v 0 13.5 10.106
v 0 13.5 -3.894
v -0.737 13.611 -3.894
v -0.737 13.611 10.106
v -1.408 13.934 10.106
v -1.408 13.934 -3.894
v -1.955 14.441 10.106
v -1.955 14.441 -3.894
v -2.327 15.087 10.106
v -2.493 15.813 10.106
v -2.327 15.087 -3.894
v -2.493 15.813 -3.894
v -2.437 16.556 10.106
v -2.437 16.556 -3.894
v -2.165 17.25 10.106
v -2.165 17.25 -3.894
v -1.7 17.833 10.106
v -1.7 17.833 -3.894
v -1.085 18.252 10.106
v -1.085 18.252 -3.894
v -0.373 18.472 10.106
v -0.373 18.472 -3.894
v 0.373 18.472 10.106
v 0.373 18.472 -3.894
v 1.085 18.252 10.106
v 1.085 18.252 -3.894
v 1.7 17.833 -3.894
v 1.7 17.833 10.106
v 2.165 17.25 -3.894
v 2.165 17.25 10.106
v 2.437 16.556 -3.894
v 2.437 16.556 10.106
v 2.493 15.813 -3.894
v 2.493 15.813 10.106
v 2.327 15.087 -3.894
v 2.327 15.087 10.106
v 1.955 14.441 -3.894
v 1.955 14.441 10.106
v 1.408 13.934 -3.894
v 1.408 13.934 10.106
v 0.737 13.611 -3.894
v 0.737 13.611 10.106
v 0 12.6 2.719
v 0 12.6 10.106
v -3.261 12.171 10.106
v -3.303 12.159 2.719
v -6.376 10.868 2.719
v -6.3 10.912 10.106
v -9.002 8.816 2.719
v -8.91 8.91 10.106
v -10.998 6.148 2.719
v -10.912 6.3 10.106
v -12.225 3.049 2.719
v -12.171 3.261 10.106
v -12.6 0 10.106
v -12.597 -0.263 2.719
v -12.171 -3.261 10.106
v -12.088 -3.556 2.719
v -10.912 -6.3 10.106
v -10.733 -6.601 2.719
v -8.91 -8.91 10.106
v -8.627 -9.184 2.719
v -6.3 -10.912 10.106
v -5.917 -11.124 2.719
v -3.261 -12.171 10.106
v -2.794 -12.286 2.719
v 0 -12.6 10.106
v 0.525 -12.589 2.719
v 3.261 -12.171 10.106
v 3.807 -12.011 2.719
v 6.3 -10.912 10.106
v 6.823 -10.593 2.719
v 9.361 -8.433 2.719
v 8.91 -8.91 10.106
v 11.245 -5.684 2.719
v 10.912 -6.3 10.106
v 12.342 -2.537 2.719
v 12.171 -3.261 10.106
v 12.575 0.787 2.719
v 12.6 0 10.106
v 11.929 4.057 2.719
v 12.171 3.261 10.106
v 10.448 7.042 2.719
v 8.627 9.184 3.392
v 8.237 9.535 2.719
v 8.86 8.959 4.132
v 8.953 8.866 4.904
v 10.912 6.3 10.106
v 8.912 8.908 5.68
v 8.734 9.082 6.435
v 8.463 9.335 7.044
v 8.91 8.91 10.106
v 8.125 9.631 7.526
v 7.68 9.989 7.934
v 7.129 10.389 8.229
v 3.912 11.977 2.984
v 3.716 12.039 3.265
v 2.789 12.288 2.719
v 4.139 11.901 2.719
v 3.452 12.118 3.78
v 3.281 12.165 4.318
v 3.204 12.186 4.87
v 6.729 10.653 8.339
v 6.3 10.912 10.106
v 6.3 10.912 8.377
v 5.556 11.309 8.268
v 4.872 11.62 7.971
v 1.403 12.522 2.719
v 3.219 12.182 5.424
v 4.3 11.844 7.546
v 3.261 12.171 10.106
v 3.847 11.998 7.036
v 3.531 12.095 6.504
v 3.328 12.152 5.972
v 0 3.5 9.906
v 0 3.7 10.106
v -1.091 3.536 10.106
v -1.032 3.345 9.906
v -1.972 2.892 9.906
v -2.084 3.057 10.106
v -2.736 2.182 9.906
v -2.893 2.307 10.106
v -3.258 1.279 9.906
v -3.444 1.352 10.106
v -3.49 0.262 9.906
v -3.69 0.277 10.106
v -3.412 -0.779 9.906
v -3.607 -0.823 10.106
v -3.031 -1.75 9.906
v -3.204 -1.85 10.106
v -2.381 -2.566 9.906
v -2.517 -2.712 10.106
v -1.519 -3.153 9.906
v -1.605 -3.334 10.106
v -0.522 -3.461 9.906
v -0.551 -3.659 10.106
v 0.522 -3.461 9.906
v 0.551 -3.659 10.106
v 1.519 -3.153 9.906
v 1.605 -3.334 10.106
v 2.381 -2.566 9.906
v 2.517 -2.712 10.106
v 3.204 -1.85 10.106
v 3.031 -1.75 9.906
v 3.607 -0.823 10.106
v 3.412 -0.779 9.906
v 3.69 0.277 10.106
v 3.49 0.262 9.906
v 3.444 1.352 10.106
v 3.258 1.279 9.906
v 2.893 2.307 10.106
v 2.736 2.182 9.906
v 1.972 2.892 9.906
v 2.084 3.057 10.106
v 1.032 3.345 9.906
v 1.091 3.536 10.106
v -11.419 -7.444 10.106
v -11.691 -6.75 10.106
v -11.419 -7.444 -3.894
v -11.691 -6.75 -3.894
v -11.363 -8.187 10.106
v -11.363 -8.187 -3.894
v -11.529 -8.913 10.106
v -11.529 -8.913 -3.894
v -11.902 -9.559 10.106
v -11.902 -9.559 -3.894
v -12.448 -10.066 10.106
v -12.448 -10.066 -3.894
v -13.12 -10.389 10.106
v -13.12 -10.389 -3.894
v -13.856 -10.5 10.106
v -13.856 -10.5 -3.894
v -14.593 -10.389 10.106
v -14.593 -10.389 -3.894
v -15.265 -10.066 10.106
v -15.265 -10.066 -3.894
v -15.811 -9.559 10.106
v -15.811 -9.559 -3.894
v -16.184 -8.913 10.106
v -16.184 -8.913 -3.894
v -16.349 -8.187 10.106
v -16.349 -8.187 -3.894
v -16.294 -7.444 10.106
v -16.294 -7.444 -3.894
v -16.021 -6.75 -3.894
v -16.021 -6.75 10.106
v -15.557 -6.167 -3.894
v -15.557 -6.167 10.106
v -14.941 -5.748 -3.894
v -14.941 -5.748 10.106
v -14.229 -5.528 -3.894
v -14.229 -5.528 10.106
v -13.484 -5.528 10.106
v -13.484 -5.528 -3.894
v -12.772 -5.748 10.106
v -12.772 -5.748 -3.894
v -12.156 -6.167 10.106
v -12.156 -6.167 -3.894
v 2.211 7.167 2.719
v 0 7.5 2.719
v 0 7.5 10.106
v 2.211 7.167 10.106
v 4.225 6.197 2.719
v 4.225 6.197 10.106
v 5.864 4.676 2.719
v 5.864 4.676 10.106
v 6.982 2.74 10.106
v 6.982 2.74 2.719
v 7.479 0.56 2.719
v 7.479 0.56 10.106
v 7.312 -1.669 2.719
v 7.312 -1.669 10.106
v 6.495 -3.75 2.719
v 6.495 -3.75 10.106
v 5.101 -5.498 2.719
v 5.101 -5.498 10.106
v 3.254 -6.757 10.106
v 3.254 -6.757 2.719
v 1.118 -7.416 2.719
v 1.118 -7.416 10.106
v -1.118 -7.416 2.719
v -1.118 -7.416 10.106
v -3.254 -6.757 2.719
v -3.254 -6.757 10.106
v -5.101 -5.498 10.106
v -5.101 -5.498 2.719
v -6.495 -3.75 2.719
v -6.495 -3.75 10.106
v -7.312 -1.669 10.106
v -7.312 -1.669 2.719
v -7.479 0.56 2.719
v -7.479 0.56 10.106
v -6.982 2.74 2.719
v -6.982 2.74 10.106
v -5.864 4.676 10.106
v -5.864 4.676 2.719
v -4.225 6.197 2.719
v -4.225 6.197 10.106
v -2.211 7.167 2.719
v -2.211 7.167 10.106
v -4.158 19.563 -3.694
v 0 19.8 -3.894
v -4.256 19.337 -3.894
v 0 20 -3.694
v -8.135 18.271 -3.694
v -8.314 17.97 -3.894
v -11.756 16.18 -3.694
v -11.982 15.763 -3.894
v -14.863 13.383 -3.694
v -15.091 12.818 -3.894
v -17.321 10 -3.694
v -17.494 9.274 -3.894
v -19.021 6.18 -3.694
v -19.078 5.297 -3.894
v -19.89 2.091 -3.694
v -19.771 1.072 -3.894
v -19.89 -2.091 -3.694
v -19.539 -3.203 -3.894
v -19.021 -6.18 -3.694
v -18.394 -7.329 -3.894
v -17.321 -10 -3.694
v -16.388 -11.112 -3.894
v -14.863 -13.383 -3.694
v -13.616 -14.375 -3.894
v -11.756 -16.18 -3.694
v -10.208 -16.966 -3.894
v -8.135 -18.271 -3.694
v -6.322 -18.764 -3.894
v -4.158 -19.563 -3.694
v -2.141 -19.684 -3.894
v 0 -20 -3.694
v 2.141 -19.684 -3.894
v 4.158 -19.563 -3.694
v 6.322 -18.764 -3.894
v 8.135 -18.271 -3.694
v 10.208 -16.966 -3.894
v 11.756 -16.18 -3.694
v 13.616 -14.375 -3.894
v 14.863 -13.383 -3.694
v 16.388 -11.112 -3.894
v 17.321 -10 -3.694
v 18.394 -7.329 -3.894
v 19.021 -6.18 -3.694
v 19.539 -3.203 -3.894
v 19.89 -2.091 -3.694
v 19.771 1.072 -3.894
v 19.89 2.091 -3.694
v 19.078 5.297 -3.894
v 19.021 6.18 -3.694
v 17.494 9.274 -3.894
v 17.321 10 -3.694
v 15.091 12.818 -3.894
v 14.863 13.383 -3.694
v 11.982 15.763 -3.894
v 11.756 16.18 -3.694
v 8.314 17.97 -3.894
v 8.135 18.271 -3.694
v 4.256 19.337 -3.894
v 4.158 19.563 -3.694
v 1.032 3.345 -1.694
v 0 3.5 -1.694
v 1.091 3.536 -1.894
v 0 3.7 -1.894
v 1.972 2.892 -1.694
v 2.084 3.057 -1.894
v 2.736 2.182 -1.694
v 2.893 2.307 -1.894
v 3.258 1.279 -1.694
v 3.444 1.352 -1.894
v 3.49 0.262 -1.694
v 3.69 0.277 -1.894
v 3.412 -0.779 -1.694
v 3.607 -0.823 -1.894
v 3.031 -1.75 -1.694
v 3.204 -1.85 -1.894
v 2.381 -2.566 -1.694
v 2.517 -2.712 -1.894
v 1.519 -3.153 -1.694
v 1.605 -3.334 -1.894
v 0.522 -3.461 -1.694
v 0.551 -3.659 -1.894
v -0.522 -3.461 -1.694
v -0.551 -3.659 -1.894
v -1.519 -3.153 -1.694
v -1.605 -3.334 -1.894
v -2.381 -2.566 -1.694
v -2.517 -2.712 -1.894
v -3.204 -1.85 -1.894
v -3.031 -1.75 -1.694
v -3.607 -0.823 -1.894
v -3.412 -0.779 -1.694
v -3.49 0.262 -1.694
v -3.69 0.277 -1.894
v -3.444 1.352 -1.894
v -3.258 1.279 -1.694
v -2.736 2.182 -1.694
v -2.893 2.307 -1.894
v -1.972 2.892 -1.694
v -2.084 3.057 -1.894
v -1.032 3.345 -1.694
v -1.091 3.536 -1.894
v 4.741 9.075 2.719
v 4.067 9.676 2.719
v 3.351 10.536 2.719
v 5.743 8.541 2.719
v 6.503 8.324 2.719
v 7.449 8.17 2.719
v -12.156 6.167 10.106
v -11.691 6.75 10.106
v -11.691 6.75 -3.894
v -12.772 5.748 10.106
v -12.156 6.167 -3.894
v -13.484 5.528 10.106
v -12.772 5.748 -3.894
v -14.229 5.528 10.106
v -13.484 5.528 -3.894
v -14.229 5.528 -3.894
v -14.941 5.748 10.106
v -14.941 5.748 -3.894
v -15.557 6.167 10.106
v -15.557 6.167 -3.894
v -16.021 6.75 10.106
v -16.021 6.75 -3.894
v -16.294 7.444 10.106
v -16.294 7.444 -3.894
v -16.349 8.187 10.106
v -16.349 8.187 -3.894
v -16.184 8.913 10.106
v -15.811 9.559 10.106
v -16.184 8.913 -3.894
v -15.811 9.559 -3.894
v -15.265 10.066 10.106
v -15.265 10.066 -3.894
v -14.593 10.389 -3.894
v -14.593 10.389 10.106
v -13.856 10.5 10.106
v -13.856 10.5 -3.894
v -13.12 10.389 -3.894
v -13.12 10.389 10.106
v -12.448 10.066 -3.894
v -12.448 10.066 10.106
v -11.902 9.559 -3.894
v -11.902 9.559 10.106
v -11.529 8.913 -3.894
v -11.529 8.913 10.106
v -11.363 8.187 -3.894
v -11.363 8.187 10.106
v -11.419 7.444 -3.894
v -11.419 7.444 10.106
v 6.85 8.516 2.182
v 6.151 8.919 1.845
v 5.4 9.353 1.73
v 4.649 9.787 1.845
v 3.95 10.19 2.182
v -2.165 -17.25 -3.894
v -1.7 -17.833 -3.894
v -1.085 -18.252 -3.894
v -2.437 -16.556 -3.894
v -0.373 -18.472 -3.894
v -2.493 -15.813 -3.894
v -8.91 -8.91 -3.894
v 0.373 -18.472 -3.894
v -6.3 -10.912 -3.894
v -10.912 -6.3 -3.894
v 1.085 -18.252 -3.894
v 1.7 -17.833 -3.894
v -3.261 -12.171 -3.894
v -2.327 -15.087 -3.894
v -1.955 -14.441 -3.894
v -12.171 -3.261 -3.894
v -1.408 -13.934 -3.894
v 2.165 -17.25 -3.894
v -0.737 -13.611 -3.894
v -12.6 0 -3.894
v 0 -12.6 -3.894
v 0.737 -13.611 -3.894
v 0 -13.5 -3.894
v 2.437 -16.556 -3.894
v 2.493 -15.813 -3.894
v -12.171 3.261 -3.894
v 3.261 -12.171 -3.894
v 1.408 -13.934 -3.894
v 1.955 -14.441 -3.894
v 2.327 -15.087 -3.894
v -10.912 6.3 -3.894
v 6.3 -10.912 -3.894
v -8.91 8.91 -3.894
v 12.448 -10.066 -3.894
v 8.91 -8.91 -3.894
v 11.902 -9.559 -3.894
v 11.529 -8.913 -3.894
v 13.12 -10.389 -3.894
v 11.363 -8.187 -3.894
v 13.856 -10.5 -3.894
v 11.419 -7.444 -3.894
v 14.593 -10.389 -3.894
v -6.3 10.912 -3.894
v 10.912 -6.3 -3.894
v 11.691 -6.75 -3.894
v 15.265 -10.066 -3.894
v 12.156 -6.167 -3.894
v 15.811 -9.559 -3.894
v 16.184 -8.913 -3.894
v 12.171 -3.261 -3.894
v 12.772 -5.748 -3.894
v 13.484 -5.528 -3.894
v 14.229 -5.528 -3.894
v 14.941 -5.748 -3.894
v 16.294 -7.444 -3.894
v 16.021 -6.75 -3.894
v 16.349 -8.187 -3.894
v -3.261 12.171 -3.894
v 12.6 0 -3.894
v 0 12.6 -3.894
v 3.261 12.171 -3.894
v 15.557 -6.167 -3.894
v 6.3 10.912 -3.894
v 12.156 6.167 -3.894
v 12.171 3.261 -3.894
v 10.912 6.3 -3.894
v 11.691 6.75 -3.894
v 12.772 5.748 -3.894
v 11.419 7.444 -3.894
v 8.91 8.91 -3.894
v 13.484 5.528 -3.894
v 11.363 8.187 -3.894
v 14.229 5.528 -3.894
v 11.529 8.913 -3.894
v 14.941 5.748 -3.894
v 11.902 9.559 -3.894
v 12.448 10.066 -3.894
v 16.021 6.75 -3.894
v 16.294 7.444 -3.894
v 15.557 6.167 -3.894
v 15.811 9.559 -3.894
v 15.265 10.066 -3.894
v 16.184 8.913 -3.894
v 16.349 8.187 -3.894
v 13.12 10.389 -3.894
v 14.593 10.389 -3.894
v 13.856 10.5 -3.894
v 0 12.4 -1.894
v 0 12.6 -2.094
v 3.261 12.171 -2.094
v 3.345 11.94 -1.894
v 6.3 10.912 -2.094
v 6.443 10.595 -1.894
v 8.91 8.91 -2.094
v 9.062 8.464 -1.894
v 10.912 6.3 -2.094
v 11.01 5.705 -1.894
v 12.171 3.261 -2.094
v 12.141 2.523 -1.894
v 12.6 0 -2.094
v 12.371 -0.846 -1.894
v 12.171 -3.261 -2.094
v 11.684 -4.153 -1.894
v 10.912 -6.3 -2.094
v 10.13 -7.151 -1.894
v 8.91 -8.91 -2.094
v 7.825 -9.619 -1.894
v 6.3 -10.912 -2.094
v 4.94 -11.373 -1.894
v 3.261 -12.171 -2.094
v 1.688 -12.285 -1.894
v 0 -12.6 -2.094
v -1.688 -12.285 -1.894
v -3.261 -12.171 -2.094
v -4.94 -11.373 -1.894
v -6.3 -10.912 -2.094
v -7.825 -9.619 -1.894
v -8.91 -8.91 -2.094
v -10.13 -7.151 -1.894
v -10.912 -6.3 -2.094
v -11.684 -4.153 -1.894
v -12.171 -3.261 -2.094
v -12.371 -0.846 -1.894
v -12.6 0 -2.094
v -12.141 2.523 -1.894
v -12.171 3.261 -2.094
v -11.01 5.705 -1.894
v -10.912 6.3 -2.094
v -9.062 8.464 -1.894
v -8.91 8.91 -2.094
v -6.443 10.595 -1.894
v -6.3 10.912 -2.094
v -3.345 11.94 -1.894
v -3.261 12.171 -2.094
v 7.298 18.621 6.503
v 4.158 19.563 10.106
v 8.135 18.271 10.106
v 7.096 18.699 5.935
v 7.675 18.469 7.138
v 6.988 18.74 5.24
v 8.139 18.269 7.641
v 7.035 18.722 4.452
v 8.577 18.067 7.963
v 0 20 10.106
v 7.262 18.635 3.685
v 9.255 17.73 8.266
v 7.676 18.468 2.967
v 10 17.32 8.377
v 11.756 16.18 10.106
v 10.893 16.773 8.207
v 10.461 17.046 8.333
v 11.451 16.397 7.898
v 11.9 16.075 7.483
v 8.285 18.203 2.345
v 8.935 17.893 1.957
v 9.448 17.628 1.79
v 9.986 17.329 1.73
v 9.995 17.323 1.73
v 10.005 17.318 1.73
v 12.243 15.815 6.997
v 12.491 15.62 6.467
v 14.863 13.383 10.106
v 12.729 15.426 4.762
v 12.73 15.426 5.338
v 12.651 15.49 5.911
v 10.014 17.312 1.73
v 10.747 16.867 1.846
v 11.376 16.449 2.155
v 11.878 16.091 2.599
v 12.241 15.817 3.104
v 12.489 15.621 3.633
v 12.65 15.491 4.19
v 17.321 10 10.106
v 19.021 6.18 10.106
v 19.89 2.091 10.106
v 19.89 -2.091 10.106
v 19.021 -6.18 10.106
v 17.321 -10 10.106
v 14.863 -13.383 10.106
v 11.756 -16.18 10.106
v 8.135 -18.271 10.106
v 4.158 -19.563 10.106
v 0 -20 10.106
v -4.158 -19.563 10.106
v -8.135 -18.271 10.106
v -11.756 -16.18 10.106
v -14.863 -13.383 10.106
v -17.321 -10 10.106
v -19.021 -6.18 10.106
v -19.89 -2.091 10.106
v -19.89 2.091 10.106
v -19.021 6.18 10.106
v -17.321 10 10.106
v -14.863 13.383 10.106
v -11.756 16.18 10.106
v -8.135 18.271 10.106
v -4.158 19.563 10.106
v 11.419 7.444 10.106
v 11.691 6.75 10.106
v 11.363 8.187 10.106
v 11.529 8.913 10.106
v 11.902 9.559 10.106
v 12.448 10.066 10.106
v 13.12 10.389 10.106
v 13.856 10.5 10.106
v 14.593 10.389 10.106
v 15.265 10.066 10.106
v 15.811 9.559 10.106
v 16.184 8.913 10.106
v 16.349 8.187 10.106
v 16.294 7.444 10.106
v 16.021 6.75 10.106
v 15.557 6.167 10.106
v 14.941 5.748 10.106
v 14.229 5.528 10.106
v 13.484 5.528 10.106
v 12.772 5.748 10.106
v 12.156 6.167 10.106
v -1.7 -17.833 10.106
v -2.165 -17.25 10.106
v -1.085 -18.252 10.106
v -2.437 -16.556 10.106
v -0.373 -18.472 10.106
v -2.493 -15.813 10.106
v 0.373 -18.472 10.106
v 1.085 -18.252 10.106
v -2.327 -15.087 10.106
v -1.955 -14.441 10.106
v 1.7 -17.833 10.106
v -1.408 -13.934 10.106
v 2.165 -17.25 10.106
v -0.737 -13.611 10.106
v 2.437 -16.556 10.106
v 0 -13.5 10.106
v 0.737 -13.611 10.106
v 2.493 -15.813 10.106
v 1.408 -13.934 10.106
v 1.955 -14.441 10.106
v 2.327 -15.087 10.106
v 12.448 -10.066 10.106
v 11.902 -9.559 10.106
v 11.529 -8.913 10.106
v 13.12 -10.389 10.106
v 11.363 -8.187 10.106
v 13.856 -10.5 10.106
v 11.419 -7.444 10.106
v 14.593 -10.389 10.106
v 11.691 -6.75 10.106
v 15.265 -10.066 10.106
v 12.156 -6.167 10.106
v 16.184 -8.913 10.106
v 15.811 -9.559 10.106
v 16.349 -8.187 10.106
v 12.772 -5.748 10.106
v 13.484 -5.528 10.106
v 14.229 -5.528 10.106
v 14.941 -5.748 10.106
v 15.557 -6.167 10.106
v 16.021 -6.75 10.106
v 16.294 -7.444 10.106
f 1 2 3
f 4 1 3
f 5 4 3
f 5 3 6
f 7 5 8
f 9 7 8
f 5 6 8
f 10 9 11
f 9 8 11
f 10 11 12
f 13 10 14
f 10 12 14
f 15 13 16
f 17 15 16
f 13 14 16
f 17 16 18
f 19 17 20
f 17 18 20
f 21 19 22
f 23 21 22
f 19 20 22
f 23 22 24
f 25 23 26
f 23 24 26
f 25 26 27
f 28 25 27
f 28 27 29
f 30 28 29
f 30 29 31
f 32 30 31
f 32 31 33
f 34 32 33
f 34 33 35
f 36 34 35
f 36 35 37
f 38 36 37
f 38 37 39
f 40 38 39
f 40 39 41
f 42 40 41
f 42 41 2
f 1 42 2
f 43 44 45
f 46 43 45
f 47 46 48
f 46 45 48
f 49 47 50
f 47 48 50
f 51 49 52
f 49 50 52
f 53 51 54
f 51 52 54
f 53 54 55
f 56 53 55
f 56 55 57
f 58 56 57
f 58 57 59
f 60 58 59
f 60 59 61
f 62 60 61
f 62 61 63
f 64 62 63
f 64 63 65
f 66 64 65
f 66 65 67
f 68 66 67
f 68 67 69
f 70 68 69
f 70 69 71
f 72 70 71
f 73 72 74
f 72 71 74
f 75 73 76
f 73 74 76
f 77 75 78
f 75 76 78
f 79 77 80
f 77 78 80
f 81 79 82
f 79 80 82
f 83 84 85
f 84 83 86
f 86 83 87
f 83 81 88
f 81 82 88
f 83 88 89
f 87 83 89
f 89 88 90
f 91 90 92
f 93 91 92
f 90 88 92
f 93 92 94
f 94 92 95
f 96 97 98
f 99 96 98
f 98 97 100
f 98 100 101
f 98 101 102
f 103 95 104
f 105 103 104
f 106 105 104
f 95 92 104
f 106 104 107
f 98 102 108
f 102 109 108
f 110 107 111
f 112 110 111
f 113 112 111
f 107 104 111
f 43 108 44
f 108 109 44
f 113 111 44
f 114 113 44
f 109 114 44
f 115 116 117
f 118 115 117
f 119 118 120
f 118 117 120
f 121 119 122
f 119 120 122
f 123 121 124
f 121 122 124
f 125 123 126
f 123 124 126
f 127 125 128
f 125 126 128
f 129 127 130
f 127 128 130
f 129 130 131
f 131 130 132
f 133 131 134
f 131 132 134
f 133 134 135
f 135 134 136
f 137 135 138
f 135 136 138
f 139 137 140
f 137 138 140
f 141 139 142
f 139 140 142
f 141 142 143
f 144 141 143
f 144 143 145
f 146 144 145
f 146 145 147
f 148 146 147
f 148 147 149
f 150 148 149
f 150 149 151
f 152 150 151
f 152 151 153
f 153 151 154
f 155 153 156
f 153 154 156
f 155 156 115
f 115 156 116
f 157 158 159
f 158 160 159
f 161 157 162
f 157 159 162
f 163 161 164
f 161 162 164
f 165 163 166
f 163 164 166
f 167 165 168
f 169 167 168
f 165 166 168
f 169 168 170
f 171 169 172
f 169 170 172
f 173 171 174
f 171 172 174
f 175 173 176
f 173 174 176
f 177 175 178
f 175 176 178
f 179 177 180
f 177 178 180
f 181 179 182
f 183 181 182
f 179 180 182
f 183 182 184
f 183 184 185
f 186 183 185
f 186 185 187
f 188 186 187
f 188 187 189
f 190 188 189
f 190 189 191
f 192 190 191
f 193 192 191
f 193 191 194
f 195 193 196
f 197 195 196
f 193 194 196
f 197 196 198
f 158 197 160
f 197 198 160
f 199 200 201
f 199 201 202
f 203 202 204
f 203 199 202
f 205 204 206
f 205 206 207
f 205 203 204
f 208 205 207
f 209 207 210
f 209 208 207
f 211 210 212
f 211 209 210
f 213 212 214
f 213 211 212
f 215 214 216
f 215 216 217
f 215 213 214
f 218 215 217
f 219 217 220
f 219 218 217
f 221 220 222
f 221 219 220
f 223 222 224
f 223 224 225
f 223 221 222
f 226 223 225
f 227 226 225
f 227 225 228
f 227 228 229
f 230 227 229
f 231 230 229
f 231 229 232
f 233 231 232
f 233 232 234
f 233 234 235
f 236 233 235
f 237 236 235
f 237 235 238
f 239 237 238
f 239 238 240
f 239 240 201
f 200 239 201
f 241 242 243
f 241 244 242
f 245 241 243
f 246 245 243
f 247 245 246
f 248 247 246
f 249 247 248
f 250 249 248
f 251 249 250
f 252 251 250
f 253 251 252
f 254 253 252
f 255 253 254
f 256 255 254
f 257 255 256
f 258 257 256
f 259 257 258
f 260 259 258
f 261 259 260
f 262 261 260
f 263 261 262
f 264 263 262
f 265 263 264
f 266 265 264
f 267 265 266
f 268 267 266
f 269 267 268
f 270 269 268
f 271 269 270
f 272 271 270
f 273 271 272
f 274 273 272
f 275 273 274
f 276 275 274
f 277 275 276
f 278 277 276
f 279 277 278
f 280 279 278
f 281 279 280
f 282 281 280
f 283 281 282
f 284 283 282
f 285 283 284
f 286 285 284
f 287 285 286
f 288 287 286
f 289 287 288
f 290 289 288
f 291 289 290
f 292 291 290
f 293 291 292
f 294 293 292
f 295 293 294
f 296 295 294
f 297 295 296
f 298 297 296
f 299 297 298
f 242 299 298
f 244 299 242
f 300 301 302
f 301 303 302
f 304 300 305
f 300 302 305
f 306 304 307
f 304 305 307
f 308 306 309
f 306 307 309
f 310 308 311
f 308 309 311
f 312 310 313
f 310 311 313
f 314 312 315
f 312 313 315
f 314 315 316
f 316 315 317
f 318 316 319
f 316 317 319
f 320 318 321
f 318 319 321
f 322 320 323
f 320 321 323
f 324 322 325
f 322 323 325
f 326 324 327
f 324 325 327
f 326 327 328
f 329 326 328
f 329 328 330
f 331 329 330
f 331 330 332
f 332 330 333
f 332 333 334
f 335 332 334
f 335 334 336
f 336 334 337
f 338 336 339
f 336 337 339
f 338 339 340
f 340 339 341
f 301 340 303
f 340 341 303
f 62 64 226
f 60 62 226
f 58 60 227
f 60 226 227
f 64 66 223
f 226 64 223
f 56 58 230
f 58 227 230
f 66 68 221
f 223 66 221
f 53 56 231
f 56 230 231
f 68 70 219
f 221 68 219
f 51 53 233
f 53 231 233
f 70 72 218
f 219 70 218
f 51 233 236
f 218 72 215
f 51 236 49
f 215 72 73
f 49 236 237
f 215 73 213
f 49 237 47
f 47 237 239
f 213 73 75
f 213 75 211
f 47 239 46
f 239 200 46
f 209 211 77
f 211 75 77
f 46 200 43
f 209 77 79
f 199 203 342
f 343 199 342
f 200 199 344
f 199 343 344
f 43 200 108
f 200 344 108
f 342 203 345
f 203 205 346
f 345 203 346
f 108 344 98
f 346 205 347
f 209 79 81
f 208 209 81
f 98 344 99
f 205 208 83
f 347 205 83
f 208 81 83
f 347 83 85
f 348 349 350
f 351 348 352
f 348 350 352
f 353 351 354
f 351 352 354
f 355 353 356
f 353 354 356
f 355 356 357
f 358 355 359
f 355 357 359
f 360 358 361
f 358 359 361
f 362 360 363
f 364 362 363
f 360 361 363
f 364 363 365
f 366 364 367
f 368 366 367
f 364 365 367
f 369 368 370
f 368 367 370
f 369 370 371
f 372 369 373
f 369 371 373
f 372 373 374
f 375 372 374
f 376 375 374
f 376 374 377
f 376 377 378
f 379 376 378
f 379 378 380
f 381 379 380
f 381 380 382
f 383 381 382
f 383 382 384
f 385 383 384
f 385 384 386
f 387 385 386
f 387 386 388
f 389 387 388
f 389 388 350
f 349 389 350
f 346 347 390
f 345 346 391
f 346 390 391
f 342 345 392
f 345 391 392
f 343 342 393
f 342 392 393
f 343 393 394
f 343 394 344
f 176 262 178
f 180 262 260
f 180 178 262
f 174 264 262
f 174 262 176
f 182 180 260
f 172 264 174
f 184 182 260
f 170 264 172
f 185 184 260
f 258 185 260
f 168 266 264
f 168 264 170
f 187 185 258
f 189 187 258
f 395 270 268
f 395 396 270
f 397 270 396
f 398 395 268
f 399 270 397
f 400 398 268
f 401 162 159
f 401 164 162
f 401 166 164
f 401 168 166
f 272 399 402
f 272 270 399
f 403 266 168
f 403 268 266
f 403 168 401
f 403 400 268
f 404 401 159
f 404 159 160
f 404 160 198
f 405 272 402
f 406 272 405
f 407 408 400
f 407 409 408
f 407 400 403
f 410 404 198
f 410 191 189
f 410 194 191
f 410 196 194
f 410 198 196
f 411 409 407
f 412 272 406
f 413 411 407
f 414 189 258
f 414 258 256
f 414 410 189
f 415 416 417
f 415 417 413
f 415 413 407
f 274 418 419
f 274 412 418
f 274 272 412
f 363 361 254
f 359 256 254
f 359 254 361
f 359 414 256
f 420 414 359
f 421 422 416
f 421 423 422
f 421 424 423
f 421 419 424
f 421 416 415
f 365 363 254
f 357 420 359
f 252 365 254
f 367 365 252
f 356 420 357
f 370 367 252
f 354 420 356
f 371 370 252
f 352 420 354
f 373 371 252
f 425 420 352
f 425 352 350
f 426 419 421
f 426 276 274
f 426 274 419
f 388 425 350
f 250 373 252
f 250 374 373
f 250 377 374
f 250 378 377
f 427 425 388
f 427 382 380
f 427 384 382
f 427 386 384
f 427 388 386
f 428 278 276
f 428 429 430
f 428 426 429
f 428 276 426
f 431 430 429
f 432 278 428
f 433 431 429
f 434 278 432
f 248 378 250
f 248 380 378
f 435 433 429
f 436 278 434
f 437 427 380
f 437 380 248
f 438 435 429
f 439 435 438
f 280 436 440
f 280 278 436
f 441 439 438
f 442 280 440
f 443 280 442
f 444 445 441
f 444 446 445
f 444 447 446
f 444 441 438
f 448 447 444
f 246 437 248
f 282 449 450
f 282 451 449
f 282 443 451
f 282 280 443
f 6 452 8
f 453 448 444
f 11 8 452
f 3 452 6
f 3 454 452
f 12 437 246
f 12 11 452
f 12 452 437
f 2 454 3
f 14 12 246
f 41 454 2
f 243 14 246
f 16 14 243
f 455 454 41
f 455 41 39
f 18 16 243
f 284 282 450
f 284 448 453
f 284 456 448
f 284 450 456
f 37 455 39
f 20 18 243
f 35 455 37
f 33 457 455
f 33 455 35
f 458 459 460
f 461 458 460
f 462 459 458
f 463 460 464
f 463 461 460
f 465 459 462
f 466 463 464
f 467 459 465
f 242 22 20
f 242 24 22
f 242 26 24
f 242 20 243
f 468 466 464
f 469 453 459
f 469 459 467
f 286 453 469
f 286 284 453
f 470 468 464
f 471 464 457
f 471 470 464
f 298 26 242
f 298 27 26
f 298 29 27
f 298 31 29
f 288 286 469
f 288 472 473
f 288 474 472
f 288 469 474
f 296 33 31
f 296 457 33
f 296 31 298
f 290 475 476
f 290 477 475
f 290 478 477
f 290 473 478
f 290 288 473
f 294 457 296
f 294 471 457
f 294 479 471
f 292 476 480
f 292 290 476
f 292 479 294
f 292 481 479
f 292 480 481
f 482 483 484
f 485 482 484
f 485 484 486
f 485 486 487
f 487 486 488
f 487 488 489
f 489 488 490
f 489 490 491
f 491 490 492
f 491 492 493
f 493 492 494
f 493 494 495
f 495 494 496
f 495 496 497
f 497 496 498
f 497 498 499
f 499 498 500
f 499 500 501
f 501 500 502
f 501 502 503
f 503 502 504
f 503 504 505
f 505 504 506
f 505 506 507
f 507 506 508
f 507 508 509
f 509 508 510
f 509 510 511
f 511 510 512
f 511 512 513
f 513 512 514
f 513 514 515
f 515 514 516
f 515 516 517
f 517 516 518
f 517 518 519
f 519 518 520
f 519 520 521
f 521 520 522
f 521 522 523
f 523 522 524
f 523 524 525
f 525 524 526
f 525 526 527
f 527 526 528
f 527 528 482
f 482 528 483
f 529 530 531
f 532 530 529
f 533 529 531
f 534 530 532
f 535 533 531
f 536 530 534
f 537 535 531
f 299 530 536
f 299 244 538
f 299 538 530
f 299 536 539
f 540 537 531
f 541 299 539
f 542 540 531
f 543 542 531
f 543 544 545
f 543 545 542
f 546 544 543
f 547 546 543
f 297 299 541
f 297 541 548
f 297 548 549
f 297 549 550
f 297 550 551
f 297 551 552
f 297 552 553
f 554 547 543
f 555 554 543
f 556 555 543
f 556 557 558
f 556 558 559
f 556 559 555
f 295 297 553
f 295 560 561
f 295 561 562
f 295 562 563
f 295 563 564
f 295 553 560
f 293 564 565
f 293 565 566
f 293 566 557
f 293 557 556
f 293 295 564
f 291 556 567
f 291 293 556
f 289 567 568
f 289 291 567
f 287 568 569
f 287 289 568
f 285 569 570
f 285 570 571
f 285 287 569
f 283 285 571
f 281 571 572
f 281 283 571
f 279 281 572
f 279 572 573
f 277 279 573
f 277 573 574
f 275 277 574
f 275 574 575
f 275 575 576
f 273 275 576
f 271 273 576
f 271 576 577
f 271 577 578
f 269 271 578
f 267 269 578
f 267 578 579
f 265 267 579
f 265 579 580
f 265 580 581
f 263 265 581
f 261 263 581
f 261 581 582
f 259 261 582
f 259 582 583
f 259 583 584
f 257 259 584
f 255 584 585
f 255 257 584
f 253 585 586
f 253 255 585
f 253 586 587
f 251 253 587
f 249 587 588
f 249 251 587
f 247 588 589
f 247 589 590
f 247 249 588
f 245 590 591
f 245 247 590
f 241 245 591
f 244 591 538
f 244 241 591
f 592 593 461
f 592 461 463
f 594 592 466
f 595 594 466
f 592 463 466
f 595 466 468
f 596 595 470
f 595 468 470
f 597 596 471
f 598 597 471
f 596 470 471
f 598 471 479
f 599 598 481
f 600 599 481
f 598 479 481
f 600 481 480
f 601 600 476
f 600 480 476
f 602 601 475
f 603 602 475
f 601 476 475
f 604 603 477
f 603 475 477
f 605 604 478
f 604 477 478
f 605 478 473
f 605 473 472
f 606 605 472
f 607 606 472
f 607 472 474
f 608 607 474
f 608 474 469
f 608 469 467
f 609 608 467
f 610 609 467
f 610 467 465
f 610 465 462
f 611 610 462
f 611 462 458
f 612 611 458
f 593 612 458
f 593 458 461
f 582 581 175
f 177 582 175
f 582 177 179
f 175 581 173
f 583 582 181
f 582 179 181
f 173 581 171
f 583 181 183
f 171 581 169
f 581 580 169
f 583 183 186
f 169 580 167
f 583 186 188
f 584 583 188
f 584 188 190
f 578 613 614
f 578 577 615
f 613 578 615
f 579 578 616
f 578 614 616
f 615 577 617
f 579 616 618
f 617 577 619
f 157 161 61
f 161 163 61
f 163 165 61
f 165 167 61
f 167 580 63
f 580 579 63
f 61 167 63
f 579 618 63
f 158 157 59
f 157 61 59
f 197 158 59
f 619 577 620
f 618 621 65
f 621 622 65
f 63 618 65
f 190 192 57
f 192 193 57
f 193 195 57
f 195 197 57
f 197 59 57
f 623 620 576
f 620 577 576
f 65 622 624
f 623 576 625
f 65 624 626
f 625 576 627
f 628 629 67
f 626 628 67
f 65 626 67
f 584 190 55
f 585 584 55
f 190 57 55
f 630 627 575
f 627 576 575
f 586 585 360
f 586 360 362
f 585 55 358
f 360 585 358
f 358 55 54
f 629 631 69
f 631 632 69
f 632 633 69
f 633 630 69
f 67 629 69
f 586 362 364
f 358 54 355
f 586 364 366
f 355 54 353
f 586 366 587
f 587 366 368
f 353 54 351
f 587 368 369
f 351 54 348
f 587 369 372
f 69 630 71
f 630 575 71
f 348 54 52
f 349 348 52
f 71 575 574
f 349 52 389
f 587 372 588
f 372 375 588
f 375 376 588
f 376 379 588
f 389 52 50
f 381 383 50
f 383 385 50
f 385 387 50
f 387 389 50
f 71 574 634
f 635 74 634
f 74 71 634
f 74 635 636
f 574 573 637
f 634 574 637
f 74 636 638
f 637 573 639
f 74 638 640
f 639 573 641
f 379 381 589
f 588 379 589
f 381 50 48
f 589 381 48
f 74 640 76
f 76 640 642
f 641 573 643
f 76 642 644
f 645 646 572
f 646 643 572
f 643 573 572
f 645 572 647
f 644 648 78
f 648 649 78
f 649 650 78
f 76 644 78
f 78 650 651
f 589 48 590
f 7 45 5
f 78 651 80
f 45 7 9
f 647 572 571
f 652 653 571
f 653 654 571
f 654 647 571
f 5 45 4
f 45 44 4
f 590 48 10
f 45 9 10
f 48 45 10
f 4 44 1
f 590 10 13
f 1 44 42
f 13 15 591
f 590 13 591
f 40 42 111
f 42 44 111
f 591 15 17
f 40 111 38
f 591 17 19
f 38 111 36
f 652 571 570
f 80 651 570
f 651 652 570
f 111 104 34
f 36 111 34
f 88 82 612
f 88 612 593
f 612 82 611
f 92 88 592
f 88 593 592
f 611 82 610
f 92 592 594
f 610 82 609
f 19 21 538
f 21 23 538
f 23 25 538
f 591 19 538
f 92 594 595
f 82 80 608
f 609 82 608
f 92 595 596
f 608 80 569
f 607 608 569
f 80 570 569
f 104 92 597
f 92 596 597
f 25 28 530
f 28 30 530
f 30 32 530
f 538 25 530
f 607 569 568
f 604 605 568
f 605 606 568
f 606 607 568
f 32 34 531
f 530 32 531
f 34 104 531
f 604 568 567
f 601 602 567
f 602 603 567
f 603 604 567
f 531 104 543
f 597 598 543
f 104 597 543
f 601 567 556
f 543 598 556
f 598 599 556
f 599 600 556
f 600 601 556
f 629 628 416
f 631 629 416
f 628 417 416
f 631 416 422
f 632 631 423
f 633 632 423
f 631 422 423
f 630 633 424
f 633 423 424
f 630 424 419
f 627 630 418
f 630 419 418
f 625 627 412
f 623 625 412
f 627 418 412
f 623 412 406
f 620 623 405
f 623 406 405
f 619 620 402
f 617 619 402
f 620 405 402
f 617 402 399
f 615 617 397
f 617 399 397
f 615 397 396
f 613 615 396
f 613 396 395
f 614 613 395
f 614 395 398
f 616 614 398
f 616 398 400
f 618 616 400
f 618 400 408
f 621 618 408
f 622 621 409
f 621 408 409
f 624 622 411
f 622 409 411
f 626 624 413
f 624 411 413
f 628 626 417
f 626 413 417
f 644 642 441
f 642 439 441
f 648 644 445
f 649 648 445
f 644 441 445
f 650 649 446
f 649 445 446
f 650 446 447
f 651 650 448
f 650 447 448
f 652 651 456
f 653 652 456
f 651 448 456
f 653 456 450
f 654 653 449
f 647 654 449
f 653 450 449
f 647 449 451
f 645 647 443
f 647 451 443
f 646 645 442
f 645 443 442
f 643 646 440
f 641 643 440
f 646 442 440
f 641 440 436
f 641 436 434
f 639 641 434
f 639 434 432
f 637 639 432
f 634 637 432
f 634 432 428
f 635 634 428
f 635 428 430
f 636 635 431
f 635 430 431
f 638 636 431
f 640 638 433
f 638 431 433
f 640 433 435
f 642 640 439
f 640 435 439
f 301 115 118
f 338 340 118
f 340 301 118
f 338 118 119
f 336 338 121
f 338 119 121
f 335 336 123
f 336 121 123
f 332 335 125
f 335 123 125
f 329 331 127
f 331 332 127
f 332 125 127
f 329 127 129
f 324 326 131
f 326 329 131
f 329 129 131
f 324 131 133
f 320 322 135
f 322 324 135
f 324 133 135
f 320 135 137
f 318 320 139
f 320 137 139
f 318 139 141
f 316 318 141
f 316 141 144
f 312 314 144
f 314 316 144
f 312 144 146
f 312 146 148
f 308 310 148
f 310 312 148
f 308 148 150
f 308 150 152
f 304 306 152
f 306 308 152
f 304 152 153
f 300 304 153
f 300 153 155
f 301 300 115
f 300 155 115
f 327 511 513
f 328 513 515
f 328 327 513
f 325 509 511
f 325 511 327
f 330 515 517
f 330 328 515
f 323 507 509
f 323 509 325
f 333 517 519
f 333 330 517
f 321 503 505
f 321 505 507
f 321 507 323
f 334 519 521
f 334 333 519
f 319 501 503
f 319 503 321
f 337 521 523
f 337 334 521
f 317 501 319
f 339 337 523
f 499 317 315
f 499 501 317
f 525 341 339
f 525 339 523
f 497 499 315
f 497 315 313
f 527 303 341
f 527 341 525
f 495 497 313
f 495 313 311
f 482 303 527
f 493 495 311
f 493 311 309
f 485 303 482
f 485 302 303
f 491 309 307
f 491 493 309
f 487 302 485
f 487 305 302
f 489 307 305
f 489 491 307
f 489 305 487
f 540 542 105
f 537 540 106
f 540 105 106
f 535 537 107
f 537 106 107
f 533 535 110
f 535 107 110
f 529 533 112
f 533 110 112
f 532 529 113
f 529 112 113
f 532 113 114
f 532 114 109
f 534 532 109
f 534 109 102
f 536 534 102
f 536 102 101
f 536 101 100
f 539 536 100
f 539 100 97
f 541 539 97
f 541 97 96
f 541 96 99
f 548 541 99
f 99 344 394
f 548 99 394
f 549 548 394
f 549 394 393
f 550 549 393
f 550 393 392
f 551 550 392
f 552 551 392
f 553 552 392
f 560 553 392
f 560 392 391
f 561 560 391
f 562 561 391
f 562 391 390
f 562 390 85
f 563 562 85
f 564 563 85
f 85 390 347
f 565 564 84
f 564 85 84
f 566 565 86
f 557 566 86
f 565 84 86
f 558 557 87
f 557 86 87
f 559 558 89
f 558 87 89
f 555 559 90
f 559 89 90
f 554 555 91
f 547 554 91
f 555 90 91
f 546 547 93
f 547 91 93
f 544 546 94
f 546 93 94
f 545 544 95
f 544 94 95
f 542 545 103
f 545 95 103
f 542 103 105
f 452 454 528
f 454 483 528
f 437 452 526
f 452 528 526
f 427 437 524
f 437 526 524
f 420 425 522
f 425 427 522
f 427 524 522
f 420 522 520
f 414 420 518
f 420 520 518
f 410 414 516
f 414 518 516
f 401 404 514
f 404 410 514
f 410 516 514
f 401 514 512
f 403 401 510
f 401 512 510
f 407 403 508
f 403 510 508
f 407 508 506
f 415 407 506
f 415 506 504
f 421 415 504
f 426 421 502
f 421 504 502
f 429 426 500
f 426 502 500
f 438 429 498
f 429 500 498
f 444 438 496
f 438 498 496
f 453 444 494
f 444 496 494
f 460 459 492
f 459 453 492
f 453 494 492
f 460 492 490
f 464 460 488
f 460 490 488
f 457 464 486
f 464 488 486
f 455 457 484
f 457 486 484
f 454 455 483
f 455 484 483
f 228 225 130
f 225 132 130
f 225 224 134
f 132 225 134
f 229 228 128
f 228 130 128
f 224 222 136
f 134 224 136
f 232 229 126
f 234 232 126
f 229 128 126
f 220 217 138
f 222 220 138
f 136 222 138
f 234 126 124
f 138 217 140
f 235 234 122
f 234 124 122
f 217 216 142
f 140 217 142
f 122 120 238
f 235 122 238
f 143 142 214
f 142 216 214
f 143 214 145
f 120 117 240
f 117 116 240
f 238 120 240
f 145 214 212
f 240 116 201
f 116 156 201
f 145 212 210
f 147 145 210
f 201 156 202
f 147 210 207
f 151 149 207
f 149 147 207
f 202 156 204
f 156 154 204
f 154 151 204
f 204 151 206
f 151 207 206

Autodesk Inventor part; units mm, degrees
ref_plane "XZ Plane" through (0, 0, 0) normal (0, 1, 0) x (-1, 0, 0)
ref_plane "XY Plane" through (0, 0, 0) normal (0, 0, 1) x (1, 0, 0)
sketch "Sketch1" plane through (0, 0, 0) normal (1, 0, 0) x (0, 1, 0)
  line L0 (0, 0) -> (0, -33.1818)
  line L1 (20, 10.1062) -> (20, -3.8938)
  line L2 (20, -3.8938) -> (12.6, -3.8938)
  line L3 (12.6, -3.8938) -> (12.6, -1.8938)
  line L4 (12.6, -1.8938) -> (3.5, -1.8938)
  line L5 (3.5, -1.8938) -> (3.5, 10.1062)
  line L6 (7.5, 10.1062) -> (7.5, 2.7186)
  line L7 (7.5, 2.7186) -> (12.6, 2.7186)
  line L8 (12.6, 2.7186) -> (12.6, 10.1062)
  line L9 (3.5, 10.1062) -> (7.5, 10.1062)
  line L10 (12.6, 10.1062) -> (20, 10.1062)
  dimension "d0" = 7
  dimension "d1" = 25.2
  dimension "d3" = 14
  dimension "d4" = 40
  dimension "d28" = 2
  dimension "d29" = 4
revolve "Revolution1" add sketch "Sketch1" angle 360 about axis through (0, 0, 0) along (0, 0, -1)
sketch "Sketch2" plane through (0, 0, 10.1062) normal (0, 0, 1) x (1, 0, 0)
  point P0 (0, 0)
  point P1 (0, 16)
  dimension "d6" = 16
hole "Hole1" at (0, 16, 10.1062) direction (0, 0, -1) diameter 5 end through all
pattern_circular "Circular Pattern1" count 6 over 360 about axis through (0, 0, 3.1062) along (0, 0, -1) of "Hole1"
ref_plane "Work Plane2" through (10, 17.3205, 3.1062) normal (0.5, 0.866, 0) x (-0.866, 0.5, 0)
ref_plane "Work Plane1" through (0, 0, 0) normal (0.5, 0.866, 0) x (0, 0, 1)
sketch "Sketch3" plane through (10, 17.3205, 3.1062) normal (0.5, 0.866, 0) x (-0.866, 0.5, 0)
  line L0 (-20, 7) -> (20, 7) projected
  line L1 (-20, -7) -> (20, -7) projected
  line L2 (0, 7) -> (0, -3.1062)
  point P0 (0, 1.9469)
hole "Hole2" at (10, 17.3205, 5.0531) direction (-0.5, -0.866, 0) diameter 6.647 depth 9.2 tip angle 118 thread size "M8x1.25" class "6H" standard "ANSI Metric M Profile"
chamfer "Chamfer1" distance 0.2 angle 45 4 edges at (0, -20, -3.8938) (0, -3.5, 10.1062) (0, -3.5, -1.8938) (0, -12.6, -1.8938)
properties part number "MirrorHeatsink" material "Copper"
